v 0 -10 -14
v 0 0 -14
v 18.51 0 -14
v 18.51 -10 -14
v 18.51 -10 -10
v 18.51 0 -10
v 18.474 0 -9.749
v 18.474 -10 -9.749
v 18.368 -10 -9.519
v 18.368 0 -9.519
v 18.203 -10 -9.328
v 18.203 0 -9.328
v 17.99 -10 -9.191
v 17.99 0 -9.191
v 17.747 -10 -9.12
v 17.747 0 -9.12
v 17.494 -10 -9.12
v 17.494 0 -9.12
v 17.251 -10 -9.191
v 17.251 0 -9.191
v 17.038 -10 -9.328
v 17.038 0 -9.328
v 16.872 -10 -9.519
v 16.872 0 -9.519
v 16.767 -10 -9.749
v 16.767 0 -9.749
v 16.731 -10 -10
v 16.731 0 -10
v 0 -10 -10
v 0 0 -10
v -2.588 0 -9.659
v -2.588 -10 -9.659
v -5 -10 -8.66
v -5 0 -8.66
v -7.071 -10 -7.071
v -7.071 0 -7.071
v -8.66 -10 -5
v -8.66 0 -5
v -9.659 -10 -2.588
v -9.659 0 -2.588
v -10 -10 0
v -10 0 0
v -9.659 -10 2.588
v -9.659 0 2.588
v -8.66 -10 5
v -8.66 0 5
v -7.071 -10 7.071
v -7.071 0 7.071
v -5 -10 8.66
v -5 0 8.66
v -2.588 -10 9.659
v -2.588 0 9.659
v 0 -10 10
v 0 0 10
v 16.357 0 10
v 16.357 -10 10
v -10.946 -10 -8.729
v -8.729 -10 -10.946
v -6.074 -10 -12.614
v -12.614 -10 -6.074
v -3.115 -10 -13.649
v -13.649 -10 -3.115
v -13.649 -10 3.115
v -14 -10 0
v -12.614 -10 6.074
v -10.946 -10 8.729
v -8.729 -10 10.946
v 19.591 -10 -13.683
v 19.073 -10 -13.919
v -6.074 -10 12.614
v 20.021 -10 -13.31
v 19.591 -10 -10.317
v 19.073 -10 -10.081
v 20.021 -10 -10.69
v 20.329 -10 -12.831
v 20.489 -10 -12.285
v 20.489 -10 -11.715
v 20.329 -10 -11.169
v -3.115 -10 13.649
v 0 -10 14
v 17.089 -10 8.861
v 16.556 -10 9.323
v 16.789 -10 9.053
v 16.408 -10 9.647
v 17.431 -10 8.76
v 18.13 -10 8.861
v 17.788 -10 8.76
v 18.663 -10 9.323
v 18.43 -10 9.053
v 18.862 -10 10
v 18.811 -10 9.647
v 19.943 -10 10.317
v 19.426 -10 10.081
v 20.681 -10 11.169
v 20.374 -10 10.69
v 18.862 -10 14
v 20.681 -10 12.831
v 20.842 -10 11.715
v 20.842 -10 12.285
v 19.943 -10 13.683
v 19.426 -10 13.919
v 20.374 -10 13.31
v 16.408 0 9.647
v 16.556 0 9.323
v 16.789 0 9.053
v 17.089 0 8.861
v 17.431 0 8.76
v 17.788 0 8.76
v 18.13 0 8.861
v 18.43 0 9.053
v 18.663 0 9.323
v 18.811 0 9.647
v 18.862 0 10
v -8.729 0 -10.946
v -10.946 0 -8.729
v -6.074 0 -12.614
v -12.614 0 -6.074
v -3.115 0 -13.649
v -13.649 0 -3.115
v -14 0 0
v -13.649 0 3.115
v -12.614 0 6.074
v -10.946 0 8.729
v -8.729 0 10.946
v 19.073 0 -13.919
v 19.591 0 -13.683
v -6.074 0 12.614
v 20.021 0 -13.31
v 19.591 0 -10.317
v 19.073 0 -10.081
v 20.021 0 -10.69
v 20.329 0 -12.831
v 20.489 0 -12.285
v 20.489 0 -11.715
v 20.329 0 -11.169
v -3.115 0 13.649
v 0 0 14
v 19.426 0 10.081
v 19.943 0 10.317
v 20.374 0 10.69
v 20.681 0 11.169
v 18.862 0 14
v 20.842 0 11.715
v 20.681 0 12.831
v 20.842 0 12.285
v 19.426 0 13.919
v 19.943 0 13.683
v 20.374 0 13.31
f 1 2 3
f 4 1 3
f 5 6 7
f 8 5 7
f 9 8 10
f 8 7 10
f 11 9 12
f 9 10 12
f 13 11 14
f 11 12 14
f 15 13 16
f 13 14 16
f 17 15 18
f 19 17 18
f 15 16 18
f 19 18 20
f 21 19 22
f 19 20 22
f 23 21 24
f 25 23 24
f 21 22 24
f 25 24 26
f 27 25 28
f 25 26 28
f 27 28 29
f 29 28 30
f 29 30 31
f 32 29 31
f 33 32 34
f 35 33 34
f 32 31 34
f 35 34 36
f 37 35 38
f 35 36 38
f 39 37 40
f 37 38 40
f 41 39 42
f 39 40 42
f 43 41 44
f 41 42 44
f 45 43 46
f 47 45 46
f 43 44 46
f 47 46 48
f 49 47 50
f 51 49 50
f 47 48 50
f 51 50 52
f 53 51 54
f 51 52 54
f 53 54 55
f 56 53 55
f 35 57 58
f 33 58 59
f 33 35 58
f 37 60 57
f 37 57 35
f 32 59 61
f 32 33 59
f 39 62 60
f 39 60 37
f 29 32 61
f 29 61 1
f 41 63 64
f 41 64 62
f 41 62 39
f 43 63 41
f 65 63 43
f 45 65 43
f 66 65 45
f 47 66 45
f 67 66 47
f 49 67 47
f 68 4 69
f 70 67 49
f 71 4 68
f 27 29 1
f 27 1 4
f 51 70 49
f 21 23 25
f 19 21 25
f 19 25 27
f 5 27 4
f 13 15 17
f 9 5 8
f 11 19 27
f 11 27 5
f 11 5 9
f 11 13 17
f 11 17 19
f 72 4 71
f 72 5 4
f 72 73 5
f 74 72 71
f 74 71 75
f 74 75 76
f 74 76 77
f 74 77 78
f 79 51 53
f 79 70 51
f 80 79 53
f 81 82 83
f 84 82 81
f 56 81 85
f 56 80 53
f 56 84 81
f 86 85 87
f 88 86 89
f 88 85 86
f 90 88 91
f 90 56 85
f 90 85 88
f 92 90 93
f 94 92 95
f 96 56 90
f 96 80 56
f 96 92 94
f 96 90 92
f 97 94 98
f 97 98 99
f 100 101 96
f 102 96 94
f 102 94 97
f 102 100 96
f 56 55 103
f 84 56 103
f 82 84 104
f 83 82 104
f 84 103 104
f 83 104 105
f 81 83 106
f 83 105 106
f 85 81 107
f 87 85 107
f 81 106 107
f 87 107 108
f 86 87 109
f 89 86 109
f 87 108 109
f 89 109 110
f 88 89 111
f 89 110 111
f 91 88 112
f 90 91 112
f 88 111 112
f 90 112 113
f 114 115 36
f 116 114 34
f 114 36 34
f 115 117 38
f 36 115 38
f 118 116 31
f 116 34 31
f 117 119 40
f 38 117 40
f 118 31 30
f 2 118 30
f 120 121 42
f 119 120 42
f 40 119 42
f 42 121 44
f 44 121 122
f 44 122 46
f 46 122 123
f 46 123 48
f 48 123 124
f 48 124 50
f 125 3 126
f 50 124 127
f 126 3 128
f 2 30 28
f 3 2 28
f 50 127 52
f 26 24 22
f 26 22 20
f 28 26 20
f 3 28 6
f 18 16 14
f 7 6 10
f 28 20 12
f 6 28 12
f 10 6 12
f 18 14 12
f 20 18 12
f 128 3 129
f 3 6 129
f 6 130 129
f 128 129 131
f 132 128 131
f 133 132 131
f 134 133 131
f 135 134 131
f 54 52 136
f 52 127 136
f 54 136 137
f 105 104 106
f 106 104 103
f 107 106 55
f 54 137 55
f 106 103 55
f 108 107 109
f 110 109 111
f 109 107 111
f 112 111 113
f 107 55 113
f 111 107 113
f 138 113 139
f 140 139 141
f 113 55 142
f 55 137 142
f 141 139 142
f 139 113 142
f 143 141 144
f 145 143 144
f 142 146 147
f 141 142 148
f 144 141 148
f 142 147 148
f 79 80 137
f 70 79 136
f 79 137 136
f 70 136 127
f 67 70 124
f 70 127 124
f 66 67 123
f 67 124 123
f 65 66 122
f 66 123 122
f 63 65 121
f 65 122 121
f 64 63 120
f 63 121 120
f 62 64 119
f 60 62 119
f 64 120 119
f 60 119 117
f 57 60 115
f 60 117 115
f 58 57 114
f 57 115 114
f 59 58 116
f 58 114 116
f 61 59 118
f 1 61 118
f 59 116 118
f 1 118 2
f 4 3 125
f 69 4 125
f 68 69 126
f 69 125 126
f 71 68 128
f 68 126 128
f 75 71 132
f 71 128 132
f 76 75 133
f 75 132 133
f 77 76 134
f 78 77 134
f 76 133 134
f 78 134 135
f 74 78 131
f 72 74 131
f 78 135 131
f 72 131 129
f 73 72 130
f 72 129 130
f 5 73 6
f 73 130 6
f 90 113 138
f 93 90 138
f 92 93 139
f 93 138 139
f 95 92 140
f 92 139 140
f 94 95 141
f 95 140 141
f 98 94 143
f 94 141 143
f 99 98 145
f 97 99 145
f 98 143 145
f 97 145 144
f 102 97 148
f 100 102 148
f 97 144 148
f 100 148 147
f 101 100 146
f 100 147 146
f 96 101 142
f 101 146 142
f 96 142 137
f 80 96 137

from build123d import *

# Parameters (mm, degrees)
F1_DEPTH = 10


with BuildPart() as f1:
    # F0 (on Front) → F1 (new body)
    with BuildSketch(Plane.XZ):
        with BuildLine():
            ThreePointArc((0, -10), (-10, 0), (0, 10))
            Line((0, 10), (16.356886, 10))
            Line((16.356886, 10), (18.862135, 10))
            Line((18.862135, 10), (18.862135, 14))
            Line((18.862135, 14), (0, 14))
            ThreePointArc((0, 14), (-14, 0), (0, -14))
            Line((0, -14), (18.509572, -14))
            Line((18.509572, -14), (18.509572, -10))
            Line((18.509572, -10), (16.730837, -10))
            Line((16.730837, -10), (0, -10))
        make_face()
        with BuildLine():
            Line((18.862135, 14), (18.862135, 10))
            ThreePointArc((18.862135, 10), (20.862135, 12), (18.862135, 14))
        make_face()
        with BuildLine():
            Line((18.862135, 10), (16.356886, 10))
            ThreePointArc((16.356886, 10), (17.60951, 8.747376), (18.862135, 10))
        make_face()
        with BuildLine():
            ThreePointArc((18.509572, -14), (20.509572, -12), (18.509572, -10))
            Line((18.509572, -10), (18.509572, -14))
        make_face()
        with BuildLine():
            ThreePointArc((18.509572, -10), (17.620205, -9.110632), (16.730837, -10))
            Line((16.730837, -10), (18.509572, -10))
        make_face()
    extrude(amount=F1_DEPTH)


solid = f1.part
